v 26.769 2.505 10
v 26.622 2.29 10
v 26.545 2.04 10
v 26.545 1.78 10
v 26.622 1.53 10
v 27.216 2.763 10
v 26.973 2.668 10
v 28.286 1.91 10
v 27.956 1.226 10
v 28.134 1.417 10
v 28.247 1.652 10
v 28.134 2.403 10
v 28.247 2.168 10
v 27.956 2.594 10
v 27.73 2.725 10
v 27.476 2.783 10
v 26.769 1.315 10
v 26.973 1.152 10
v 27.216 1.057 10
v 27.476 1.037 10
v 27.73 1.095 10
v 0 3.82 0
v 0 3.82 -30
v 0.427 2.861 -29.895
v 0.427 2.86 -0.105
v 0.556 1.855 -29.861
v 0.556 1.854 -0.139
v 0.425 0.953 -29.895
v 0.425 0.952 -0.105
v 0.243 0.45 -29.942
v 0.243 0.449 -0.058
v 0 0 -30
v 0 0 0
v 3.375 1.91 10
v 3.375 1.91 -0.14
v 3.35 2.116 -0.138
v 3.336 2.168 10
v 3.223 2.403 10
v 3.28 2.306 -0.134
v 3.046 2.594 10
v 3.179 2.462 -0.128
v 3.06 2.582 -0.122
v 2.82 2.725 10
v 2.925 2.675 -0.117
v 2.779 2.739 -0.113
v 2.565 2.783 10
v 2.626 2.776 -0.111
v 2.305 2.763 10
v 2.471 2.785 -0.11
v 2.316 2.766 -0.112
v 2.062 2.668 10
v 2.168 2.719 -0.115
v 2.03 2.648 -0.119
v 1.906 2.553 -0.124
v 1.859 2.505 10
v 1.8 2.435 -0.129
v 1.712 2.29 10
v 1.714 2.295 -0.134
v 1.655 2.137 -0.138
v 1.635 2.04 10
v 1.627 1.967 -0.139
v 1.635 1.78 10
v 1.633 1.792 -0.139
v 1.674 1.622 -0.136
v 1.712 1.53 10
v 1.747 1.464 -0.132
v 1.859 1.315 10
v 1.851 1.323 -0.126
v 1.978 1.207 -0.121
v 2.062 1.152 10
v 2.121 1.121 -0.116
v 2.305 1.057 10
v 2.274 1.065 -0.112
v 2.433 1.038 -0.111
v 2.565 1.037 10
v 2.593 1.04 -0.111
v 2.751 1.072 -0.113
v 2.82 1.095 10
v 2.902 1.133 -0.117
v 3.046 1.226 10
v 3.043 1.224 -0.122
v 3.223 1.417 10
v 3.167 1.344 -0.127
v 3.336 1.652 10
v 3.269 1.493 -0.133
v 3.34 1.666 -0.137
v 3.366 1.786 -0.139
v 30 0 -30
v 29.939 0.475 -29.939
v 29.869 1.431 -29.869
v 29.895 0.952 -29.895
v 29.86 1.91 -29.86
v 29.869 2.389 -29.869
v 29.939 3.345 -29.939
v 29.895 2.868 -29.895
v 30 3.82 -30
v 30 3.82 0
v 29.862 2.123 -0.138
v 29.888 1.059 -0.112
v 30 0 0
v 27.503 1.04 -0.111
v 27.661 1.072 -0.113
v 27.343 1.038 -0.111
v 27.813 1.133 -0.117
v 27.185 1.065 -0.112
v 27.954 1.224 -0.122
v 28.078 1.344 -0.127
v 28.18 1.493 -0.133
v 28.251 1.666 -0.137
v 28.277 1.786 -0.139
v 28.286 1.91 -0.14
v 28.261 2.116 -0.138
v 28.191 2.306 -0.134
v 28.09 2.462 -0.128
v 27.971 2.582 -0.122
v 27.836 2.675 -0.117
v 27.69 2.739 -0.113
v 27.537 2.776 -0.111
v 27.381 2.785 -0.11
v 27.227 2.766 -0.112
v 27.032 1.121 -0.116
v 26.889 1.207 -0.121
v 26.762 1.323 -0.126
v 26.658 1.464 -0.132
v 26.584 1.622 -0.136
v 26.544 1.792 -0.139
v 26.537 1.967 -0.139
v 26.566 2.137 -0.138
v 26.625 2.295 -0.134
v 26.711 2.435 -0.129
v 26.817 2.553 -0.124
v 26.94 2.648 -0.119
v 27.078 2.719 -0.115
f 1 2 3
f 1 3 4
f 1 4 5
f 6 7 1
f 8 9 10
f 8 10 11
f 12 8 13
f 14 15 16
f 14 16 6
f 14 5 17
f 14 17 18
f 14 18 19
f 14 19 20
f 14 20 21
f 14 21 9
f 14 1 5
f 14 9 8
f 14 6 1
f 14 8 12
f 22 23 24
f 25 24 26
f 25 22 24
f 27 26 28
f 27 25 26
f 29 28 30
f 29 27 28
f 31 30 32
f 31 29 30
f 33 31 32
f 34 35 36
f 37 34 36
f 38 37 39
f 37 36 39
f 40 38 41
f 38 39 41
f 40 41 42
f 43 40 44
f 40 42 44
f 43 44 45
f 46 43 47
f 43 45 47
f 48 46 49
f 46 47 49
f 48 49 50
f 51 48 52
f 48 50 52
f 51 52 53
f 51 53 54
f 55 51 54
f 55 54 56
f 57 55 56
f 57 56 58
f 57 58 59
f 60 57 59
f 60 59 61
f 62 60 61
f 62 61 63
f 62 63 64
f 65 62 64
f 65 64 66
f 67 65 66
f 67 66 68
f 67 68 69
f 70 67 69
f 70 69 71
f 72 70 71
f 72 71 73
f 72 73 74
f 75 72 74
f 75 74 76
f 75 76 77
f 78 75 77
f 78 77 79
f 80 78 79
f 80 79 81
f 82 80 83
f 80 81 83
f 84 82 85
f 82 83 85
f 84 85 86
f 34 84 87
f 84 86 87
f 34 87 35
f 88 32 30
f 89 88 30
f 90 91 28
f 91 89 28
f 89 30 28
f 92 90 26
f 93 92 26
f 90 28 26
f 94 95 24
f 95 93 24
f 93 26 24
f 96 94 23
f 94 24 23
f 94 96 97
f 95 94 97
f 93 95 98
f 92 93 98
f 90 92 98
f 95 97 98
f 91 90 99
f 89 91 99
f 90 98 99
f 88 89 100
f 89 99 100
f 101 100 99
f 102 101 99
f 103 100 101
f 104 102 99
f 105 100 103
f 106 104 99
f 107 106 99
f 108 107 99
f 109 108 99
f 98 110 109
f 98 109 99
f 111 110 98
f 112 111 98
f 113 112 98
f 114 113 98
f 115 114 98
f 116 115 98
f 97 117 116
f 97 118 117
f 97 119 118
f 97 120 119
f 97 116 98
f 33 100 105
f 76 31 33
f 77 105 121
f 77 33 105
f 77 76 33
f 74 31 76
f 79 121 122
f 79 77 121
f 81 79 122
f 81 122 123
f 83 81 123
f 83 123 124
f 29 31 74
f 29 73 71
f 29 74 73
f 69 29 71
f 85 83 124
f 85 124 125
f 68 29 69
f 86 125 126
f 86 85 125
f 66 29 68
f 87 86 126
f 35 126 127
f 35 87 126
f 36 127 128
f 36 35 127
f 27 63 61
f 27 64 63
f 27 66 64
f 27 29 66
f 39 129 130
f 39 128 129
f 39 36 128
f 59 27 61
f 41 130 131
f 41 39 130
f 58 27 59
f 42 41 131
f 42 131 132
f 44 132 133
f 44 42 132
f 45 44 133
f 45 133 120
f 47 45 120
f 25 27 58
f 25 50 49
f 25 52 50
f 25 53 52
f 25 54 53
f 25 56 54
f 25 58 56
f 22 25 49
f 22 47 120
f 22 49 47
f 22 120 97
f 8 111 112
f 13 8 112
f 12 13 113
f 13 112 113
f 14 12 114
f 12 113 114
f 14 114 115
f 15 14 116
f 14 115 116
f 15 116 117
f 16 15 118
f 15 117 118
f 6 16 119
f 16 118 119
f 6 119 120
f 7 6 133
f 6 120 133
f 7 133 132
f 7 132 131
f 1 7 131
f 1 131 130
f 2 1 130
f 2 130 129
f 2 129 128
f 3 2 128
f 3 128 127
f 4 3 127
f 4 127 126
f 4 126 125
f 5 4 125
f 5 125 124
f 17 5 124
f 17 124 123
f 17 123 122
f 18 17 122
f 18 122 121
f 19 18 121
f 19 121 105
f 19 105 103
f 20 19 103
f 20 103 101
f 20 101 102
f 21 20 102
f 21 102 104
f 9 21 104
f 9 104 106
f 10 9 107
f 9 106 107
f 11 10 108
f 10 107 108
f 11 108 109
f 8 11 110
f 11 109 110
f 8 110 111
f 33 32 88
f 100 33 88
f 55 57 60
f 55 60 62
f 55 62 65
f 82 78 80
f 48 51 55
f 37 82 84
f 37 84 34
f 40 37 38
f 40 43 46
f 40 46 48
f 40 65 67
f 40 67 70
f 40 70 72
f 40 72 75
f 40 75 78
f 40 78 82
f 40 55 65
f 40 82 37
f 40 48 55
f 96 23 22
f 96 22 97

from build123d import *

# Parameters (mm, degrees)
SKETCH1_W                = 30
SKETCH1_H                = 30
BOSS_EXTRUDE1_DEPTH      = 3.82
CUT_EXTRUDE2_DEPTH       = 43.598032818
CUT_EXTRUDE5_DEPTH       = 45
BOSS_EXTRUDE2_DEPTH      = 10
BOSS_EXTRUDE2_DEPTH_BACK = 5
SKETCH4_R                = 0.875
BOSS_EXTRUDE3_DEPTH      = 10
BOSS_EXTRUDE3_DEPTH_BACK = 5
SKETCH5_R                = 0.875


with BuildPart() as part:
    # Sketch1 → Boss-Extrude1 (new body)
    with BuildSketch(Plane(origin=(0, 0, 0), x_dir=(1, 0, 0), z_dir=(0, 1, 0))):
        with Locations((15, 15)):
            Rectangle(SKETCH1_W, SKETCH1_H)
    extrude(amount=BOSS_EXTRUDE1_DEPTH)

    # Sketch2 → Cut-Extrude2 (cut, through all)
    with BuildSketch(Plane.XY):
        Polygon((-3, 1.91), (0, 1.91), (0, 3.82), align=None)
        with BuildLine():
            ThreePointArc((0, 3.82), (0.556416736, 1.91), (0, 0))
            Line((0, 0), (0, 3.82))
        make_face()
        Polygon((0, 0), (0, 1.91), (-3, 1.91), align=None)
        Polygon((30, 3.82), (30, 1.91), (43, 1.91), align=None)
        Polygon((43, 1.91), (30, 1.91), (30, 0), align=None)
        with BuildLine():
            ThreePointArc((30, 3.82), (29.860437602, 1.91), (30, 0))
            Line((30, 0), (30, 3.82))
        make_face()
    extrude(amount=-CUT_EXTRUDE2_DEPTH, mode=Mode.SUBTRACT)

    # Sketch3 → Cut-Extrude5 (cut)
    with BuildSketch(Plane(origin=(0, 0, 0), x_dir=(0, 0, -1), z_dir=(1, 0, 0))):
        with BuildLine():
            Line((30, 3.82), (43, 1.91))
            Line((43, 1.91), (30, 0))
            ThreePointArc((30, 0), (29.860437602, 1.91), (30, 3.82))
        make_face()
        with BuildLine():
            Line((0, 3.82), (-13, 1.91))
            Line((-13, 1.91), (0, 0))
            ThreePointArc((0, 0), (0.139562398, 1.91), (0, 3.82))
        make_face()
    extrude(amount=CUT_EXTRUDE5_DEPTH, mode=Mode.SUBTRACT)

    # Sketch4 → Boss-Extrude2 (add, two sides: drawn at the far end of the back side and taken through both)
    with BuildSketch(Plane.XY.offset(-BOSS_EXTRUDE2_DEPTH_BACK)):
        with Locations((2.5, 1.91)):
            Circle(SKETCH4_R)
    extrude(amount=BOSS_EXTRUDE2_DEPTH + BOSS_EXTRUDE2_DEPTH_BACK)

    # Sketch5 → Boss-Extrude3 (add, two sides: drawn at the far end of the back side and taken through both)
    with BuildSketch(Plane.XY.offset(-BOSS_EXTRUDE3_DEPTH_BACK)):
        with Locations((27.410666516, 1.91)):
            Circle(SKETCH5_R)
    extrude(amount=BOSS_EXTRUDE3_DEPTH + BOSS_EXTRUDE3_DEPTH_BACK)


solid = part.part
